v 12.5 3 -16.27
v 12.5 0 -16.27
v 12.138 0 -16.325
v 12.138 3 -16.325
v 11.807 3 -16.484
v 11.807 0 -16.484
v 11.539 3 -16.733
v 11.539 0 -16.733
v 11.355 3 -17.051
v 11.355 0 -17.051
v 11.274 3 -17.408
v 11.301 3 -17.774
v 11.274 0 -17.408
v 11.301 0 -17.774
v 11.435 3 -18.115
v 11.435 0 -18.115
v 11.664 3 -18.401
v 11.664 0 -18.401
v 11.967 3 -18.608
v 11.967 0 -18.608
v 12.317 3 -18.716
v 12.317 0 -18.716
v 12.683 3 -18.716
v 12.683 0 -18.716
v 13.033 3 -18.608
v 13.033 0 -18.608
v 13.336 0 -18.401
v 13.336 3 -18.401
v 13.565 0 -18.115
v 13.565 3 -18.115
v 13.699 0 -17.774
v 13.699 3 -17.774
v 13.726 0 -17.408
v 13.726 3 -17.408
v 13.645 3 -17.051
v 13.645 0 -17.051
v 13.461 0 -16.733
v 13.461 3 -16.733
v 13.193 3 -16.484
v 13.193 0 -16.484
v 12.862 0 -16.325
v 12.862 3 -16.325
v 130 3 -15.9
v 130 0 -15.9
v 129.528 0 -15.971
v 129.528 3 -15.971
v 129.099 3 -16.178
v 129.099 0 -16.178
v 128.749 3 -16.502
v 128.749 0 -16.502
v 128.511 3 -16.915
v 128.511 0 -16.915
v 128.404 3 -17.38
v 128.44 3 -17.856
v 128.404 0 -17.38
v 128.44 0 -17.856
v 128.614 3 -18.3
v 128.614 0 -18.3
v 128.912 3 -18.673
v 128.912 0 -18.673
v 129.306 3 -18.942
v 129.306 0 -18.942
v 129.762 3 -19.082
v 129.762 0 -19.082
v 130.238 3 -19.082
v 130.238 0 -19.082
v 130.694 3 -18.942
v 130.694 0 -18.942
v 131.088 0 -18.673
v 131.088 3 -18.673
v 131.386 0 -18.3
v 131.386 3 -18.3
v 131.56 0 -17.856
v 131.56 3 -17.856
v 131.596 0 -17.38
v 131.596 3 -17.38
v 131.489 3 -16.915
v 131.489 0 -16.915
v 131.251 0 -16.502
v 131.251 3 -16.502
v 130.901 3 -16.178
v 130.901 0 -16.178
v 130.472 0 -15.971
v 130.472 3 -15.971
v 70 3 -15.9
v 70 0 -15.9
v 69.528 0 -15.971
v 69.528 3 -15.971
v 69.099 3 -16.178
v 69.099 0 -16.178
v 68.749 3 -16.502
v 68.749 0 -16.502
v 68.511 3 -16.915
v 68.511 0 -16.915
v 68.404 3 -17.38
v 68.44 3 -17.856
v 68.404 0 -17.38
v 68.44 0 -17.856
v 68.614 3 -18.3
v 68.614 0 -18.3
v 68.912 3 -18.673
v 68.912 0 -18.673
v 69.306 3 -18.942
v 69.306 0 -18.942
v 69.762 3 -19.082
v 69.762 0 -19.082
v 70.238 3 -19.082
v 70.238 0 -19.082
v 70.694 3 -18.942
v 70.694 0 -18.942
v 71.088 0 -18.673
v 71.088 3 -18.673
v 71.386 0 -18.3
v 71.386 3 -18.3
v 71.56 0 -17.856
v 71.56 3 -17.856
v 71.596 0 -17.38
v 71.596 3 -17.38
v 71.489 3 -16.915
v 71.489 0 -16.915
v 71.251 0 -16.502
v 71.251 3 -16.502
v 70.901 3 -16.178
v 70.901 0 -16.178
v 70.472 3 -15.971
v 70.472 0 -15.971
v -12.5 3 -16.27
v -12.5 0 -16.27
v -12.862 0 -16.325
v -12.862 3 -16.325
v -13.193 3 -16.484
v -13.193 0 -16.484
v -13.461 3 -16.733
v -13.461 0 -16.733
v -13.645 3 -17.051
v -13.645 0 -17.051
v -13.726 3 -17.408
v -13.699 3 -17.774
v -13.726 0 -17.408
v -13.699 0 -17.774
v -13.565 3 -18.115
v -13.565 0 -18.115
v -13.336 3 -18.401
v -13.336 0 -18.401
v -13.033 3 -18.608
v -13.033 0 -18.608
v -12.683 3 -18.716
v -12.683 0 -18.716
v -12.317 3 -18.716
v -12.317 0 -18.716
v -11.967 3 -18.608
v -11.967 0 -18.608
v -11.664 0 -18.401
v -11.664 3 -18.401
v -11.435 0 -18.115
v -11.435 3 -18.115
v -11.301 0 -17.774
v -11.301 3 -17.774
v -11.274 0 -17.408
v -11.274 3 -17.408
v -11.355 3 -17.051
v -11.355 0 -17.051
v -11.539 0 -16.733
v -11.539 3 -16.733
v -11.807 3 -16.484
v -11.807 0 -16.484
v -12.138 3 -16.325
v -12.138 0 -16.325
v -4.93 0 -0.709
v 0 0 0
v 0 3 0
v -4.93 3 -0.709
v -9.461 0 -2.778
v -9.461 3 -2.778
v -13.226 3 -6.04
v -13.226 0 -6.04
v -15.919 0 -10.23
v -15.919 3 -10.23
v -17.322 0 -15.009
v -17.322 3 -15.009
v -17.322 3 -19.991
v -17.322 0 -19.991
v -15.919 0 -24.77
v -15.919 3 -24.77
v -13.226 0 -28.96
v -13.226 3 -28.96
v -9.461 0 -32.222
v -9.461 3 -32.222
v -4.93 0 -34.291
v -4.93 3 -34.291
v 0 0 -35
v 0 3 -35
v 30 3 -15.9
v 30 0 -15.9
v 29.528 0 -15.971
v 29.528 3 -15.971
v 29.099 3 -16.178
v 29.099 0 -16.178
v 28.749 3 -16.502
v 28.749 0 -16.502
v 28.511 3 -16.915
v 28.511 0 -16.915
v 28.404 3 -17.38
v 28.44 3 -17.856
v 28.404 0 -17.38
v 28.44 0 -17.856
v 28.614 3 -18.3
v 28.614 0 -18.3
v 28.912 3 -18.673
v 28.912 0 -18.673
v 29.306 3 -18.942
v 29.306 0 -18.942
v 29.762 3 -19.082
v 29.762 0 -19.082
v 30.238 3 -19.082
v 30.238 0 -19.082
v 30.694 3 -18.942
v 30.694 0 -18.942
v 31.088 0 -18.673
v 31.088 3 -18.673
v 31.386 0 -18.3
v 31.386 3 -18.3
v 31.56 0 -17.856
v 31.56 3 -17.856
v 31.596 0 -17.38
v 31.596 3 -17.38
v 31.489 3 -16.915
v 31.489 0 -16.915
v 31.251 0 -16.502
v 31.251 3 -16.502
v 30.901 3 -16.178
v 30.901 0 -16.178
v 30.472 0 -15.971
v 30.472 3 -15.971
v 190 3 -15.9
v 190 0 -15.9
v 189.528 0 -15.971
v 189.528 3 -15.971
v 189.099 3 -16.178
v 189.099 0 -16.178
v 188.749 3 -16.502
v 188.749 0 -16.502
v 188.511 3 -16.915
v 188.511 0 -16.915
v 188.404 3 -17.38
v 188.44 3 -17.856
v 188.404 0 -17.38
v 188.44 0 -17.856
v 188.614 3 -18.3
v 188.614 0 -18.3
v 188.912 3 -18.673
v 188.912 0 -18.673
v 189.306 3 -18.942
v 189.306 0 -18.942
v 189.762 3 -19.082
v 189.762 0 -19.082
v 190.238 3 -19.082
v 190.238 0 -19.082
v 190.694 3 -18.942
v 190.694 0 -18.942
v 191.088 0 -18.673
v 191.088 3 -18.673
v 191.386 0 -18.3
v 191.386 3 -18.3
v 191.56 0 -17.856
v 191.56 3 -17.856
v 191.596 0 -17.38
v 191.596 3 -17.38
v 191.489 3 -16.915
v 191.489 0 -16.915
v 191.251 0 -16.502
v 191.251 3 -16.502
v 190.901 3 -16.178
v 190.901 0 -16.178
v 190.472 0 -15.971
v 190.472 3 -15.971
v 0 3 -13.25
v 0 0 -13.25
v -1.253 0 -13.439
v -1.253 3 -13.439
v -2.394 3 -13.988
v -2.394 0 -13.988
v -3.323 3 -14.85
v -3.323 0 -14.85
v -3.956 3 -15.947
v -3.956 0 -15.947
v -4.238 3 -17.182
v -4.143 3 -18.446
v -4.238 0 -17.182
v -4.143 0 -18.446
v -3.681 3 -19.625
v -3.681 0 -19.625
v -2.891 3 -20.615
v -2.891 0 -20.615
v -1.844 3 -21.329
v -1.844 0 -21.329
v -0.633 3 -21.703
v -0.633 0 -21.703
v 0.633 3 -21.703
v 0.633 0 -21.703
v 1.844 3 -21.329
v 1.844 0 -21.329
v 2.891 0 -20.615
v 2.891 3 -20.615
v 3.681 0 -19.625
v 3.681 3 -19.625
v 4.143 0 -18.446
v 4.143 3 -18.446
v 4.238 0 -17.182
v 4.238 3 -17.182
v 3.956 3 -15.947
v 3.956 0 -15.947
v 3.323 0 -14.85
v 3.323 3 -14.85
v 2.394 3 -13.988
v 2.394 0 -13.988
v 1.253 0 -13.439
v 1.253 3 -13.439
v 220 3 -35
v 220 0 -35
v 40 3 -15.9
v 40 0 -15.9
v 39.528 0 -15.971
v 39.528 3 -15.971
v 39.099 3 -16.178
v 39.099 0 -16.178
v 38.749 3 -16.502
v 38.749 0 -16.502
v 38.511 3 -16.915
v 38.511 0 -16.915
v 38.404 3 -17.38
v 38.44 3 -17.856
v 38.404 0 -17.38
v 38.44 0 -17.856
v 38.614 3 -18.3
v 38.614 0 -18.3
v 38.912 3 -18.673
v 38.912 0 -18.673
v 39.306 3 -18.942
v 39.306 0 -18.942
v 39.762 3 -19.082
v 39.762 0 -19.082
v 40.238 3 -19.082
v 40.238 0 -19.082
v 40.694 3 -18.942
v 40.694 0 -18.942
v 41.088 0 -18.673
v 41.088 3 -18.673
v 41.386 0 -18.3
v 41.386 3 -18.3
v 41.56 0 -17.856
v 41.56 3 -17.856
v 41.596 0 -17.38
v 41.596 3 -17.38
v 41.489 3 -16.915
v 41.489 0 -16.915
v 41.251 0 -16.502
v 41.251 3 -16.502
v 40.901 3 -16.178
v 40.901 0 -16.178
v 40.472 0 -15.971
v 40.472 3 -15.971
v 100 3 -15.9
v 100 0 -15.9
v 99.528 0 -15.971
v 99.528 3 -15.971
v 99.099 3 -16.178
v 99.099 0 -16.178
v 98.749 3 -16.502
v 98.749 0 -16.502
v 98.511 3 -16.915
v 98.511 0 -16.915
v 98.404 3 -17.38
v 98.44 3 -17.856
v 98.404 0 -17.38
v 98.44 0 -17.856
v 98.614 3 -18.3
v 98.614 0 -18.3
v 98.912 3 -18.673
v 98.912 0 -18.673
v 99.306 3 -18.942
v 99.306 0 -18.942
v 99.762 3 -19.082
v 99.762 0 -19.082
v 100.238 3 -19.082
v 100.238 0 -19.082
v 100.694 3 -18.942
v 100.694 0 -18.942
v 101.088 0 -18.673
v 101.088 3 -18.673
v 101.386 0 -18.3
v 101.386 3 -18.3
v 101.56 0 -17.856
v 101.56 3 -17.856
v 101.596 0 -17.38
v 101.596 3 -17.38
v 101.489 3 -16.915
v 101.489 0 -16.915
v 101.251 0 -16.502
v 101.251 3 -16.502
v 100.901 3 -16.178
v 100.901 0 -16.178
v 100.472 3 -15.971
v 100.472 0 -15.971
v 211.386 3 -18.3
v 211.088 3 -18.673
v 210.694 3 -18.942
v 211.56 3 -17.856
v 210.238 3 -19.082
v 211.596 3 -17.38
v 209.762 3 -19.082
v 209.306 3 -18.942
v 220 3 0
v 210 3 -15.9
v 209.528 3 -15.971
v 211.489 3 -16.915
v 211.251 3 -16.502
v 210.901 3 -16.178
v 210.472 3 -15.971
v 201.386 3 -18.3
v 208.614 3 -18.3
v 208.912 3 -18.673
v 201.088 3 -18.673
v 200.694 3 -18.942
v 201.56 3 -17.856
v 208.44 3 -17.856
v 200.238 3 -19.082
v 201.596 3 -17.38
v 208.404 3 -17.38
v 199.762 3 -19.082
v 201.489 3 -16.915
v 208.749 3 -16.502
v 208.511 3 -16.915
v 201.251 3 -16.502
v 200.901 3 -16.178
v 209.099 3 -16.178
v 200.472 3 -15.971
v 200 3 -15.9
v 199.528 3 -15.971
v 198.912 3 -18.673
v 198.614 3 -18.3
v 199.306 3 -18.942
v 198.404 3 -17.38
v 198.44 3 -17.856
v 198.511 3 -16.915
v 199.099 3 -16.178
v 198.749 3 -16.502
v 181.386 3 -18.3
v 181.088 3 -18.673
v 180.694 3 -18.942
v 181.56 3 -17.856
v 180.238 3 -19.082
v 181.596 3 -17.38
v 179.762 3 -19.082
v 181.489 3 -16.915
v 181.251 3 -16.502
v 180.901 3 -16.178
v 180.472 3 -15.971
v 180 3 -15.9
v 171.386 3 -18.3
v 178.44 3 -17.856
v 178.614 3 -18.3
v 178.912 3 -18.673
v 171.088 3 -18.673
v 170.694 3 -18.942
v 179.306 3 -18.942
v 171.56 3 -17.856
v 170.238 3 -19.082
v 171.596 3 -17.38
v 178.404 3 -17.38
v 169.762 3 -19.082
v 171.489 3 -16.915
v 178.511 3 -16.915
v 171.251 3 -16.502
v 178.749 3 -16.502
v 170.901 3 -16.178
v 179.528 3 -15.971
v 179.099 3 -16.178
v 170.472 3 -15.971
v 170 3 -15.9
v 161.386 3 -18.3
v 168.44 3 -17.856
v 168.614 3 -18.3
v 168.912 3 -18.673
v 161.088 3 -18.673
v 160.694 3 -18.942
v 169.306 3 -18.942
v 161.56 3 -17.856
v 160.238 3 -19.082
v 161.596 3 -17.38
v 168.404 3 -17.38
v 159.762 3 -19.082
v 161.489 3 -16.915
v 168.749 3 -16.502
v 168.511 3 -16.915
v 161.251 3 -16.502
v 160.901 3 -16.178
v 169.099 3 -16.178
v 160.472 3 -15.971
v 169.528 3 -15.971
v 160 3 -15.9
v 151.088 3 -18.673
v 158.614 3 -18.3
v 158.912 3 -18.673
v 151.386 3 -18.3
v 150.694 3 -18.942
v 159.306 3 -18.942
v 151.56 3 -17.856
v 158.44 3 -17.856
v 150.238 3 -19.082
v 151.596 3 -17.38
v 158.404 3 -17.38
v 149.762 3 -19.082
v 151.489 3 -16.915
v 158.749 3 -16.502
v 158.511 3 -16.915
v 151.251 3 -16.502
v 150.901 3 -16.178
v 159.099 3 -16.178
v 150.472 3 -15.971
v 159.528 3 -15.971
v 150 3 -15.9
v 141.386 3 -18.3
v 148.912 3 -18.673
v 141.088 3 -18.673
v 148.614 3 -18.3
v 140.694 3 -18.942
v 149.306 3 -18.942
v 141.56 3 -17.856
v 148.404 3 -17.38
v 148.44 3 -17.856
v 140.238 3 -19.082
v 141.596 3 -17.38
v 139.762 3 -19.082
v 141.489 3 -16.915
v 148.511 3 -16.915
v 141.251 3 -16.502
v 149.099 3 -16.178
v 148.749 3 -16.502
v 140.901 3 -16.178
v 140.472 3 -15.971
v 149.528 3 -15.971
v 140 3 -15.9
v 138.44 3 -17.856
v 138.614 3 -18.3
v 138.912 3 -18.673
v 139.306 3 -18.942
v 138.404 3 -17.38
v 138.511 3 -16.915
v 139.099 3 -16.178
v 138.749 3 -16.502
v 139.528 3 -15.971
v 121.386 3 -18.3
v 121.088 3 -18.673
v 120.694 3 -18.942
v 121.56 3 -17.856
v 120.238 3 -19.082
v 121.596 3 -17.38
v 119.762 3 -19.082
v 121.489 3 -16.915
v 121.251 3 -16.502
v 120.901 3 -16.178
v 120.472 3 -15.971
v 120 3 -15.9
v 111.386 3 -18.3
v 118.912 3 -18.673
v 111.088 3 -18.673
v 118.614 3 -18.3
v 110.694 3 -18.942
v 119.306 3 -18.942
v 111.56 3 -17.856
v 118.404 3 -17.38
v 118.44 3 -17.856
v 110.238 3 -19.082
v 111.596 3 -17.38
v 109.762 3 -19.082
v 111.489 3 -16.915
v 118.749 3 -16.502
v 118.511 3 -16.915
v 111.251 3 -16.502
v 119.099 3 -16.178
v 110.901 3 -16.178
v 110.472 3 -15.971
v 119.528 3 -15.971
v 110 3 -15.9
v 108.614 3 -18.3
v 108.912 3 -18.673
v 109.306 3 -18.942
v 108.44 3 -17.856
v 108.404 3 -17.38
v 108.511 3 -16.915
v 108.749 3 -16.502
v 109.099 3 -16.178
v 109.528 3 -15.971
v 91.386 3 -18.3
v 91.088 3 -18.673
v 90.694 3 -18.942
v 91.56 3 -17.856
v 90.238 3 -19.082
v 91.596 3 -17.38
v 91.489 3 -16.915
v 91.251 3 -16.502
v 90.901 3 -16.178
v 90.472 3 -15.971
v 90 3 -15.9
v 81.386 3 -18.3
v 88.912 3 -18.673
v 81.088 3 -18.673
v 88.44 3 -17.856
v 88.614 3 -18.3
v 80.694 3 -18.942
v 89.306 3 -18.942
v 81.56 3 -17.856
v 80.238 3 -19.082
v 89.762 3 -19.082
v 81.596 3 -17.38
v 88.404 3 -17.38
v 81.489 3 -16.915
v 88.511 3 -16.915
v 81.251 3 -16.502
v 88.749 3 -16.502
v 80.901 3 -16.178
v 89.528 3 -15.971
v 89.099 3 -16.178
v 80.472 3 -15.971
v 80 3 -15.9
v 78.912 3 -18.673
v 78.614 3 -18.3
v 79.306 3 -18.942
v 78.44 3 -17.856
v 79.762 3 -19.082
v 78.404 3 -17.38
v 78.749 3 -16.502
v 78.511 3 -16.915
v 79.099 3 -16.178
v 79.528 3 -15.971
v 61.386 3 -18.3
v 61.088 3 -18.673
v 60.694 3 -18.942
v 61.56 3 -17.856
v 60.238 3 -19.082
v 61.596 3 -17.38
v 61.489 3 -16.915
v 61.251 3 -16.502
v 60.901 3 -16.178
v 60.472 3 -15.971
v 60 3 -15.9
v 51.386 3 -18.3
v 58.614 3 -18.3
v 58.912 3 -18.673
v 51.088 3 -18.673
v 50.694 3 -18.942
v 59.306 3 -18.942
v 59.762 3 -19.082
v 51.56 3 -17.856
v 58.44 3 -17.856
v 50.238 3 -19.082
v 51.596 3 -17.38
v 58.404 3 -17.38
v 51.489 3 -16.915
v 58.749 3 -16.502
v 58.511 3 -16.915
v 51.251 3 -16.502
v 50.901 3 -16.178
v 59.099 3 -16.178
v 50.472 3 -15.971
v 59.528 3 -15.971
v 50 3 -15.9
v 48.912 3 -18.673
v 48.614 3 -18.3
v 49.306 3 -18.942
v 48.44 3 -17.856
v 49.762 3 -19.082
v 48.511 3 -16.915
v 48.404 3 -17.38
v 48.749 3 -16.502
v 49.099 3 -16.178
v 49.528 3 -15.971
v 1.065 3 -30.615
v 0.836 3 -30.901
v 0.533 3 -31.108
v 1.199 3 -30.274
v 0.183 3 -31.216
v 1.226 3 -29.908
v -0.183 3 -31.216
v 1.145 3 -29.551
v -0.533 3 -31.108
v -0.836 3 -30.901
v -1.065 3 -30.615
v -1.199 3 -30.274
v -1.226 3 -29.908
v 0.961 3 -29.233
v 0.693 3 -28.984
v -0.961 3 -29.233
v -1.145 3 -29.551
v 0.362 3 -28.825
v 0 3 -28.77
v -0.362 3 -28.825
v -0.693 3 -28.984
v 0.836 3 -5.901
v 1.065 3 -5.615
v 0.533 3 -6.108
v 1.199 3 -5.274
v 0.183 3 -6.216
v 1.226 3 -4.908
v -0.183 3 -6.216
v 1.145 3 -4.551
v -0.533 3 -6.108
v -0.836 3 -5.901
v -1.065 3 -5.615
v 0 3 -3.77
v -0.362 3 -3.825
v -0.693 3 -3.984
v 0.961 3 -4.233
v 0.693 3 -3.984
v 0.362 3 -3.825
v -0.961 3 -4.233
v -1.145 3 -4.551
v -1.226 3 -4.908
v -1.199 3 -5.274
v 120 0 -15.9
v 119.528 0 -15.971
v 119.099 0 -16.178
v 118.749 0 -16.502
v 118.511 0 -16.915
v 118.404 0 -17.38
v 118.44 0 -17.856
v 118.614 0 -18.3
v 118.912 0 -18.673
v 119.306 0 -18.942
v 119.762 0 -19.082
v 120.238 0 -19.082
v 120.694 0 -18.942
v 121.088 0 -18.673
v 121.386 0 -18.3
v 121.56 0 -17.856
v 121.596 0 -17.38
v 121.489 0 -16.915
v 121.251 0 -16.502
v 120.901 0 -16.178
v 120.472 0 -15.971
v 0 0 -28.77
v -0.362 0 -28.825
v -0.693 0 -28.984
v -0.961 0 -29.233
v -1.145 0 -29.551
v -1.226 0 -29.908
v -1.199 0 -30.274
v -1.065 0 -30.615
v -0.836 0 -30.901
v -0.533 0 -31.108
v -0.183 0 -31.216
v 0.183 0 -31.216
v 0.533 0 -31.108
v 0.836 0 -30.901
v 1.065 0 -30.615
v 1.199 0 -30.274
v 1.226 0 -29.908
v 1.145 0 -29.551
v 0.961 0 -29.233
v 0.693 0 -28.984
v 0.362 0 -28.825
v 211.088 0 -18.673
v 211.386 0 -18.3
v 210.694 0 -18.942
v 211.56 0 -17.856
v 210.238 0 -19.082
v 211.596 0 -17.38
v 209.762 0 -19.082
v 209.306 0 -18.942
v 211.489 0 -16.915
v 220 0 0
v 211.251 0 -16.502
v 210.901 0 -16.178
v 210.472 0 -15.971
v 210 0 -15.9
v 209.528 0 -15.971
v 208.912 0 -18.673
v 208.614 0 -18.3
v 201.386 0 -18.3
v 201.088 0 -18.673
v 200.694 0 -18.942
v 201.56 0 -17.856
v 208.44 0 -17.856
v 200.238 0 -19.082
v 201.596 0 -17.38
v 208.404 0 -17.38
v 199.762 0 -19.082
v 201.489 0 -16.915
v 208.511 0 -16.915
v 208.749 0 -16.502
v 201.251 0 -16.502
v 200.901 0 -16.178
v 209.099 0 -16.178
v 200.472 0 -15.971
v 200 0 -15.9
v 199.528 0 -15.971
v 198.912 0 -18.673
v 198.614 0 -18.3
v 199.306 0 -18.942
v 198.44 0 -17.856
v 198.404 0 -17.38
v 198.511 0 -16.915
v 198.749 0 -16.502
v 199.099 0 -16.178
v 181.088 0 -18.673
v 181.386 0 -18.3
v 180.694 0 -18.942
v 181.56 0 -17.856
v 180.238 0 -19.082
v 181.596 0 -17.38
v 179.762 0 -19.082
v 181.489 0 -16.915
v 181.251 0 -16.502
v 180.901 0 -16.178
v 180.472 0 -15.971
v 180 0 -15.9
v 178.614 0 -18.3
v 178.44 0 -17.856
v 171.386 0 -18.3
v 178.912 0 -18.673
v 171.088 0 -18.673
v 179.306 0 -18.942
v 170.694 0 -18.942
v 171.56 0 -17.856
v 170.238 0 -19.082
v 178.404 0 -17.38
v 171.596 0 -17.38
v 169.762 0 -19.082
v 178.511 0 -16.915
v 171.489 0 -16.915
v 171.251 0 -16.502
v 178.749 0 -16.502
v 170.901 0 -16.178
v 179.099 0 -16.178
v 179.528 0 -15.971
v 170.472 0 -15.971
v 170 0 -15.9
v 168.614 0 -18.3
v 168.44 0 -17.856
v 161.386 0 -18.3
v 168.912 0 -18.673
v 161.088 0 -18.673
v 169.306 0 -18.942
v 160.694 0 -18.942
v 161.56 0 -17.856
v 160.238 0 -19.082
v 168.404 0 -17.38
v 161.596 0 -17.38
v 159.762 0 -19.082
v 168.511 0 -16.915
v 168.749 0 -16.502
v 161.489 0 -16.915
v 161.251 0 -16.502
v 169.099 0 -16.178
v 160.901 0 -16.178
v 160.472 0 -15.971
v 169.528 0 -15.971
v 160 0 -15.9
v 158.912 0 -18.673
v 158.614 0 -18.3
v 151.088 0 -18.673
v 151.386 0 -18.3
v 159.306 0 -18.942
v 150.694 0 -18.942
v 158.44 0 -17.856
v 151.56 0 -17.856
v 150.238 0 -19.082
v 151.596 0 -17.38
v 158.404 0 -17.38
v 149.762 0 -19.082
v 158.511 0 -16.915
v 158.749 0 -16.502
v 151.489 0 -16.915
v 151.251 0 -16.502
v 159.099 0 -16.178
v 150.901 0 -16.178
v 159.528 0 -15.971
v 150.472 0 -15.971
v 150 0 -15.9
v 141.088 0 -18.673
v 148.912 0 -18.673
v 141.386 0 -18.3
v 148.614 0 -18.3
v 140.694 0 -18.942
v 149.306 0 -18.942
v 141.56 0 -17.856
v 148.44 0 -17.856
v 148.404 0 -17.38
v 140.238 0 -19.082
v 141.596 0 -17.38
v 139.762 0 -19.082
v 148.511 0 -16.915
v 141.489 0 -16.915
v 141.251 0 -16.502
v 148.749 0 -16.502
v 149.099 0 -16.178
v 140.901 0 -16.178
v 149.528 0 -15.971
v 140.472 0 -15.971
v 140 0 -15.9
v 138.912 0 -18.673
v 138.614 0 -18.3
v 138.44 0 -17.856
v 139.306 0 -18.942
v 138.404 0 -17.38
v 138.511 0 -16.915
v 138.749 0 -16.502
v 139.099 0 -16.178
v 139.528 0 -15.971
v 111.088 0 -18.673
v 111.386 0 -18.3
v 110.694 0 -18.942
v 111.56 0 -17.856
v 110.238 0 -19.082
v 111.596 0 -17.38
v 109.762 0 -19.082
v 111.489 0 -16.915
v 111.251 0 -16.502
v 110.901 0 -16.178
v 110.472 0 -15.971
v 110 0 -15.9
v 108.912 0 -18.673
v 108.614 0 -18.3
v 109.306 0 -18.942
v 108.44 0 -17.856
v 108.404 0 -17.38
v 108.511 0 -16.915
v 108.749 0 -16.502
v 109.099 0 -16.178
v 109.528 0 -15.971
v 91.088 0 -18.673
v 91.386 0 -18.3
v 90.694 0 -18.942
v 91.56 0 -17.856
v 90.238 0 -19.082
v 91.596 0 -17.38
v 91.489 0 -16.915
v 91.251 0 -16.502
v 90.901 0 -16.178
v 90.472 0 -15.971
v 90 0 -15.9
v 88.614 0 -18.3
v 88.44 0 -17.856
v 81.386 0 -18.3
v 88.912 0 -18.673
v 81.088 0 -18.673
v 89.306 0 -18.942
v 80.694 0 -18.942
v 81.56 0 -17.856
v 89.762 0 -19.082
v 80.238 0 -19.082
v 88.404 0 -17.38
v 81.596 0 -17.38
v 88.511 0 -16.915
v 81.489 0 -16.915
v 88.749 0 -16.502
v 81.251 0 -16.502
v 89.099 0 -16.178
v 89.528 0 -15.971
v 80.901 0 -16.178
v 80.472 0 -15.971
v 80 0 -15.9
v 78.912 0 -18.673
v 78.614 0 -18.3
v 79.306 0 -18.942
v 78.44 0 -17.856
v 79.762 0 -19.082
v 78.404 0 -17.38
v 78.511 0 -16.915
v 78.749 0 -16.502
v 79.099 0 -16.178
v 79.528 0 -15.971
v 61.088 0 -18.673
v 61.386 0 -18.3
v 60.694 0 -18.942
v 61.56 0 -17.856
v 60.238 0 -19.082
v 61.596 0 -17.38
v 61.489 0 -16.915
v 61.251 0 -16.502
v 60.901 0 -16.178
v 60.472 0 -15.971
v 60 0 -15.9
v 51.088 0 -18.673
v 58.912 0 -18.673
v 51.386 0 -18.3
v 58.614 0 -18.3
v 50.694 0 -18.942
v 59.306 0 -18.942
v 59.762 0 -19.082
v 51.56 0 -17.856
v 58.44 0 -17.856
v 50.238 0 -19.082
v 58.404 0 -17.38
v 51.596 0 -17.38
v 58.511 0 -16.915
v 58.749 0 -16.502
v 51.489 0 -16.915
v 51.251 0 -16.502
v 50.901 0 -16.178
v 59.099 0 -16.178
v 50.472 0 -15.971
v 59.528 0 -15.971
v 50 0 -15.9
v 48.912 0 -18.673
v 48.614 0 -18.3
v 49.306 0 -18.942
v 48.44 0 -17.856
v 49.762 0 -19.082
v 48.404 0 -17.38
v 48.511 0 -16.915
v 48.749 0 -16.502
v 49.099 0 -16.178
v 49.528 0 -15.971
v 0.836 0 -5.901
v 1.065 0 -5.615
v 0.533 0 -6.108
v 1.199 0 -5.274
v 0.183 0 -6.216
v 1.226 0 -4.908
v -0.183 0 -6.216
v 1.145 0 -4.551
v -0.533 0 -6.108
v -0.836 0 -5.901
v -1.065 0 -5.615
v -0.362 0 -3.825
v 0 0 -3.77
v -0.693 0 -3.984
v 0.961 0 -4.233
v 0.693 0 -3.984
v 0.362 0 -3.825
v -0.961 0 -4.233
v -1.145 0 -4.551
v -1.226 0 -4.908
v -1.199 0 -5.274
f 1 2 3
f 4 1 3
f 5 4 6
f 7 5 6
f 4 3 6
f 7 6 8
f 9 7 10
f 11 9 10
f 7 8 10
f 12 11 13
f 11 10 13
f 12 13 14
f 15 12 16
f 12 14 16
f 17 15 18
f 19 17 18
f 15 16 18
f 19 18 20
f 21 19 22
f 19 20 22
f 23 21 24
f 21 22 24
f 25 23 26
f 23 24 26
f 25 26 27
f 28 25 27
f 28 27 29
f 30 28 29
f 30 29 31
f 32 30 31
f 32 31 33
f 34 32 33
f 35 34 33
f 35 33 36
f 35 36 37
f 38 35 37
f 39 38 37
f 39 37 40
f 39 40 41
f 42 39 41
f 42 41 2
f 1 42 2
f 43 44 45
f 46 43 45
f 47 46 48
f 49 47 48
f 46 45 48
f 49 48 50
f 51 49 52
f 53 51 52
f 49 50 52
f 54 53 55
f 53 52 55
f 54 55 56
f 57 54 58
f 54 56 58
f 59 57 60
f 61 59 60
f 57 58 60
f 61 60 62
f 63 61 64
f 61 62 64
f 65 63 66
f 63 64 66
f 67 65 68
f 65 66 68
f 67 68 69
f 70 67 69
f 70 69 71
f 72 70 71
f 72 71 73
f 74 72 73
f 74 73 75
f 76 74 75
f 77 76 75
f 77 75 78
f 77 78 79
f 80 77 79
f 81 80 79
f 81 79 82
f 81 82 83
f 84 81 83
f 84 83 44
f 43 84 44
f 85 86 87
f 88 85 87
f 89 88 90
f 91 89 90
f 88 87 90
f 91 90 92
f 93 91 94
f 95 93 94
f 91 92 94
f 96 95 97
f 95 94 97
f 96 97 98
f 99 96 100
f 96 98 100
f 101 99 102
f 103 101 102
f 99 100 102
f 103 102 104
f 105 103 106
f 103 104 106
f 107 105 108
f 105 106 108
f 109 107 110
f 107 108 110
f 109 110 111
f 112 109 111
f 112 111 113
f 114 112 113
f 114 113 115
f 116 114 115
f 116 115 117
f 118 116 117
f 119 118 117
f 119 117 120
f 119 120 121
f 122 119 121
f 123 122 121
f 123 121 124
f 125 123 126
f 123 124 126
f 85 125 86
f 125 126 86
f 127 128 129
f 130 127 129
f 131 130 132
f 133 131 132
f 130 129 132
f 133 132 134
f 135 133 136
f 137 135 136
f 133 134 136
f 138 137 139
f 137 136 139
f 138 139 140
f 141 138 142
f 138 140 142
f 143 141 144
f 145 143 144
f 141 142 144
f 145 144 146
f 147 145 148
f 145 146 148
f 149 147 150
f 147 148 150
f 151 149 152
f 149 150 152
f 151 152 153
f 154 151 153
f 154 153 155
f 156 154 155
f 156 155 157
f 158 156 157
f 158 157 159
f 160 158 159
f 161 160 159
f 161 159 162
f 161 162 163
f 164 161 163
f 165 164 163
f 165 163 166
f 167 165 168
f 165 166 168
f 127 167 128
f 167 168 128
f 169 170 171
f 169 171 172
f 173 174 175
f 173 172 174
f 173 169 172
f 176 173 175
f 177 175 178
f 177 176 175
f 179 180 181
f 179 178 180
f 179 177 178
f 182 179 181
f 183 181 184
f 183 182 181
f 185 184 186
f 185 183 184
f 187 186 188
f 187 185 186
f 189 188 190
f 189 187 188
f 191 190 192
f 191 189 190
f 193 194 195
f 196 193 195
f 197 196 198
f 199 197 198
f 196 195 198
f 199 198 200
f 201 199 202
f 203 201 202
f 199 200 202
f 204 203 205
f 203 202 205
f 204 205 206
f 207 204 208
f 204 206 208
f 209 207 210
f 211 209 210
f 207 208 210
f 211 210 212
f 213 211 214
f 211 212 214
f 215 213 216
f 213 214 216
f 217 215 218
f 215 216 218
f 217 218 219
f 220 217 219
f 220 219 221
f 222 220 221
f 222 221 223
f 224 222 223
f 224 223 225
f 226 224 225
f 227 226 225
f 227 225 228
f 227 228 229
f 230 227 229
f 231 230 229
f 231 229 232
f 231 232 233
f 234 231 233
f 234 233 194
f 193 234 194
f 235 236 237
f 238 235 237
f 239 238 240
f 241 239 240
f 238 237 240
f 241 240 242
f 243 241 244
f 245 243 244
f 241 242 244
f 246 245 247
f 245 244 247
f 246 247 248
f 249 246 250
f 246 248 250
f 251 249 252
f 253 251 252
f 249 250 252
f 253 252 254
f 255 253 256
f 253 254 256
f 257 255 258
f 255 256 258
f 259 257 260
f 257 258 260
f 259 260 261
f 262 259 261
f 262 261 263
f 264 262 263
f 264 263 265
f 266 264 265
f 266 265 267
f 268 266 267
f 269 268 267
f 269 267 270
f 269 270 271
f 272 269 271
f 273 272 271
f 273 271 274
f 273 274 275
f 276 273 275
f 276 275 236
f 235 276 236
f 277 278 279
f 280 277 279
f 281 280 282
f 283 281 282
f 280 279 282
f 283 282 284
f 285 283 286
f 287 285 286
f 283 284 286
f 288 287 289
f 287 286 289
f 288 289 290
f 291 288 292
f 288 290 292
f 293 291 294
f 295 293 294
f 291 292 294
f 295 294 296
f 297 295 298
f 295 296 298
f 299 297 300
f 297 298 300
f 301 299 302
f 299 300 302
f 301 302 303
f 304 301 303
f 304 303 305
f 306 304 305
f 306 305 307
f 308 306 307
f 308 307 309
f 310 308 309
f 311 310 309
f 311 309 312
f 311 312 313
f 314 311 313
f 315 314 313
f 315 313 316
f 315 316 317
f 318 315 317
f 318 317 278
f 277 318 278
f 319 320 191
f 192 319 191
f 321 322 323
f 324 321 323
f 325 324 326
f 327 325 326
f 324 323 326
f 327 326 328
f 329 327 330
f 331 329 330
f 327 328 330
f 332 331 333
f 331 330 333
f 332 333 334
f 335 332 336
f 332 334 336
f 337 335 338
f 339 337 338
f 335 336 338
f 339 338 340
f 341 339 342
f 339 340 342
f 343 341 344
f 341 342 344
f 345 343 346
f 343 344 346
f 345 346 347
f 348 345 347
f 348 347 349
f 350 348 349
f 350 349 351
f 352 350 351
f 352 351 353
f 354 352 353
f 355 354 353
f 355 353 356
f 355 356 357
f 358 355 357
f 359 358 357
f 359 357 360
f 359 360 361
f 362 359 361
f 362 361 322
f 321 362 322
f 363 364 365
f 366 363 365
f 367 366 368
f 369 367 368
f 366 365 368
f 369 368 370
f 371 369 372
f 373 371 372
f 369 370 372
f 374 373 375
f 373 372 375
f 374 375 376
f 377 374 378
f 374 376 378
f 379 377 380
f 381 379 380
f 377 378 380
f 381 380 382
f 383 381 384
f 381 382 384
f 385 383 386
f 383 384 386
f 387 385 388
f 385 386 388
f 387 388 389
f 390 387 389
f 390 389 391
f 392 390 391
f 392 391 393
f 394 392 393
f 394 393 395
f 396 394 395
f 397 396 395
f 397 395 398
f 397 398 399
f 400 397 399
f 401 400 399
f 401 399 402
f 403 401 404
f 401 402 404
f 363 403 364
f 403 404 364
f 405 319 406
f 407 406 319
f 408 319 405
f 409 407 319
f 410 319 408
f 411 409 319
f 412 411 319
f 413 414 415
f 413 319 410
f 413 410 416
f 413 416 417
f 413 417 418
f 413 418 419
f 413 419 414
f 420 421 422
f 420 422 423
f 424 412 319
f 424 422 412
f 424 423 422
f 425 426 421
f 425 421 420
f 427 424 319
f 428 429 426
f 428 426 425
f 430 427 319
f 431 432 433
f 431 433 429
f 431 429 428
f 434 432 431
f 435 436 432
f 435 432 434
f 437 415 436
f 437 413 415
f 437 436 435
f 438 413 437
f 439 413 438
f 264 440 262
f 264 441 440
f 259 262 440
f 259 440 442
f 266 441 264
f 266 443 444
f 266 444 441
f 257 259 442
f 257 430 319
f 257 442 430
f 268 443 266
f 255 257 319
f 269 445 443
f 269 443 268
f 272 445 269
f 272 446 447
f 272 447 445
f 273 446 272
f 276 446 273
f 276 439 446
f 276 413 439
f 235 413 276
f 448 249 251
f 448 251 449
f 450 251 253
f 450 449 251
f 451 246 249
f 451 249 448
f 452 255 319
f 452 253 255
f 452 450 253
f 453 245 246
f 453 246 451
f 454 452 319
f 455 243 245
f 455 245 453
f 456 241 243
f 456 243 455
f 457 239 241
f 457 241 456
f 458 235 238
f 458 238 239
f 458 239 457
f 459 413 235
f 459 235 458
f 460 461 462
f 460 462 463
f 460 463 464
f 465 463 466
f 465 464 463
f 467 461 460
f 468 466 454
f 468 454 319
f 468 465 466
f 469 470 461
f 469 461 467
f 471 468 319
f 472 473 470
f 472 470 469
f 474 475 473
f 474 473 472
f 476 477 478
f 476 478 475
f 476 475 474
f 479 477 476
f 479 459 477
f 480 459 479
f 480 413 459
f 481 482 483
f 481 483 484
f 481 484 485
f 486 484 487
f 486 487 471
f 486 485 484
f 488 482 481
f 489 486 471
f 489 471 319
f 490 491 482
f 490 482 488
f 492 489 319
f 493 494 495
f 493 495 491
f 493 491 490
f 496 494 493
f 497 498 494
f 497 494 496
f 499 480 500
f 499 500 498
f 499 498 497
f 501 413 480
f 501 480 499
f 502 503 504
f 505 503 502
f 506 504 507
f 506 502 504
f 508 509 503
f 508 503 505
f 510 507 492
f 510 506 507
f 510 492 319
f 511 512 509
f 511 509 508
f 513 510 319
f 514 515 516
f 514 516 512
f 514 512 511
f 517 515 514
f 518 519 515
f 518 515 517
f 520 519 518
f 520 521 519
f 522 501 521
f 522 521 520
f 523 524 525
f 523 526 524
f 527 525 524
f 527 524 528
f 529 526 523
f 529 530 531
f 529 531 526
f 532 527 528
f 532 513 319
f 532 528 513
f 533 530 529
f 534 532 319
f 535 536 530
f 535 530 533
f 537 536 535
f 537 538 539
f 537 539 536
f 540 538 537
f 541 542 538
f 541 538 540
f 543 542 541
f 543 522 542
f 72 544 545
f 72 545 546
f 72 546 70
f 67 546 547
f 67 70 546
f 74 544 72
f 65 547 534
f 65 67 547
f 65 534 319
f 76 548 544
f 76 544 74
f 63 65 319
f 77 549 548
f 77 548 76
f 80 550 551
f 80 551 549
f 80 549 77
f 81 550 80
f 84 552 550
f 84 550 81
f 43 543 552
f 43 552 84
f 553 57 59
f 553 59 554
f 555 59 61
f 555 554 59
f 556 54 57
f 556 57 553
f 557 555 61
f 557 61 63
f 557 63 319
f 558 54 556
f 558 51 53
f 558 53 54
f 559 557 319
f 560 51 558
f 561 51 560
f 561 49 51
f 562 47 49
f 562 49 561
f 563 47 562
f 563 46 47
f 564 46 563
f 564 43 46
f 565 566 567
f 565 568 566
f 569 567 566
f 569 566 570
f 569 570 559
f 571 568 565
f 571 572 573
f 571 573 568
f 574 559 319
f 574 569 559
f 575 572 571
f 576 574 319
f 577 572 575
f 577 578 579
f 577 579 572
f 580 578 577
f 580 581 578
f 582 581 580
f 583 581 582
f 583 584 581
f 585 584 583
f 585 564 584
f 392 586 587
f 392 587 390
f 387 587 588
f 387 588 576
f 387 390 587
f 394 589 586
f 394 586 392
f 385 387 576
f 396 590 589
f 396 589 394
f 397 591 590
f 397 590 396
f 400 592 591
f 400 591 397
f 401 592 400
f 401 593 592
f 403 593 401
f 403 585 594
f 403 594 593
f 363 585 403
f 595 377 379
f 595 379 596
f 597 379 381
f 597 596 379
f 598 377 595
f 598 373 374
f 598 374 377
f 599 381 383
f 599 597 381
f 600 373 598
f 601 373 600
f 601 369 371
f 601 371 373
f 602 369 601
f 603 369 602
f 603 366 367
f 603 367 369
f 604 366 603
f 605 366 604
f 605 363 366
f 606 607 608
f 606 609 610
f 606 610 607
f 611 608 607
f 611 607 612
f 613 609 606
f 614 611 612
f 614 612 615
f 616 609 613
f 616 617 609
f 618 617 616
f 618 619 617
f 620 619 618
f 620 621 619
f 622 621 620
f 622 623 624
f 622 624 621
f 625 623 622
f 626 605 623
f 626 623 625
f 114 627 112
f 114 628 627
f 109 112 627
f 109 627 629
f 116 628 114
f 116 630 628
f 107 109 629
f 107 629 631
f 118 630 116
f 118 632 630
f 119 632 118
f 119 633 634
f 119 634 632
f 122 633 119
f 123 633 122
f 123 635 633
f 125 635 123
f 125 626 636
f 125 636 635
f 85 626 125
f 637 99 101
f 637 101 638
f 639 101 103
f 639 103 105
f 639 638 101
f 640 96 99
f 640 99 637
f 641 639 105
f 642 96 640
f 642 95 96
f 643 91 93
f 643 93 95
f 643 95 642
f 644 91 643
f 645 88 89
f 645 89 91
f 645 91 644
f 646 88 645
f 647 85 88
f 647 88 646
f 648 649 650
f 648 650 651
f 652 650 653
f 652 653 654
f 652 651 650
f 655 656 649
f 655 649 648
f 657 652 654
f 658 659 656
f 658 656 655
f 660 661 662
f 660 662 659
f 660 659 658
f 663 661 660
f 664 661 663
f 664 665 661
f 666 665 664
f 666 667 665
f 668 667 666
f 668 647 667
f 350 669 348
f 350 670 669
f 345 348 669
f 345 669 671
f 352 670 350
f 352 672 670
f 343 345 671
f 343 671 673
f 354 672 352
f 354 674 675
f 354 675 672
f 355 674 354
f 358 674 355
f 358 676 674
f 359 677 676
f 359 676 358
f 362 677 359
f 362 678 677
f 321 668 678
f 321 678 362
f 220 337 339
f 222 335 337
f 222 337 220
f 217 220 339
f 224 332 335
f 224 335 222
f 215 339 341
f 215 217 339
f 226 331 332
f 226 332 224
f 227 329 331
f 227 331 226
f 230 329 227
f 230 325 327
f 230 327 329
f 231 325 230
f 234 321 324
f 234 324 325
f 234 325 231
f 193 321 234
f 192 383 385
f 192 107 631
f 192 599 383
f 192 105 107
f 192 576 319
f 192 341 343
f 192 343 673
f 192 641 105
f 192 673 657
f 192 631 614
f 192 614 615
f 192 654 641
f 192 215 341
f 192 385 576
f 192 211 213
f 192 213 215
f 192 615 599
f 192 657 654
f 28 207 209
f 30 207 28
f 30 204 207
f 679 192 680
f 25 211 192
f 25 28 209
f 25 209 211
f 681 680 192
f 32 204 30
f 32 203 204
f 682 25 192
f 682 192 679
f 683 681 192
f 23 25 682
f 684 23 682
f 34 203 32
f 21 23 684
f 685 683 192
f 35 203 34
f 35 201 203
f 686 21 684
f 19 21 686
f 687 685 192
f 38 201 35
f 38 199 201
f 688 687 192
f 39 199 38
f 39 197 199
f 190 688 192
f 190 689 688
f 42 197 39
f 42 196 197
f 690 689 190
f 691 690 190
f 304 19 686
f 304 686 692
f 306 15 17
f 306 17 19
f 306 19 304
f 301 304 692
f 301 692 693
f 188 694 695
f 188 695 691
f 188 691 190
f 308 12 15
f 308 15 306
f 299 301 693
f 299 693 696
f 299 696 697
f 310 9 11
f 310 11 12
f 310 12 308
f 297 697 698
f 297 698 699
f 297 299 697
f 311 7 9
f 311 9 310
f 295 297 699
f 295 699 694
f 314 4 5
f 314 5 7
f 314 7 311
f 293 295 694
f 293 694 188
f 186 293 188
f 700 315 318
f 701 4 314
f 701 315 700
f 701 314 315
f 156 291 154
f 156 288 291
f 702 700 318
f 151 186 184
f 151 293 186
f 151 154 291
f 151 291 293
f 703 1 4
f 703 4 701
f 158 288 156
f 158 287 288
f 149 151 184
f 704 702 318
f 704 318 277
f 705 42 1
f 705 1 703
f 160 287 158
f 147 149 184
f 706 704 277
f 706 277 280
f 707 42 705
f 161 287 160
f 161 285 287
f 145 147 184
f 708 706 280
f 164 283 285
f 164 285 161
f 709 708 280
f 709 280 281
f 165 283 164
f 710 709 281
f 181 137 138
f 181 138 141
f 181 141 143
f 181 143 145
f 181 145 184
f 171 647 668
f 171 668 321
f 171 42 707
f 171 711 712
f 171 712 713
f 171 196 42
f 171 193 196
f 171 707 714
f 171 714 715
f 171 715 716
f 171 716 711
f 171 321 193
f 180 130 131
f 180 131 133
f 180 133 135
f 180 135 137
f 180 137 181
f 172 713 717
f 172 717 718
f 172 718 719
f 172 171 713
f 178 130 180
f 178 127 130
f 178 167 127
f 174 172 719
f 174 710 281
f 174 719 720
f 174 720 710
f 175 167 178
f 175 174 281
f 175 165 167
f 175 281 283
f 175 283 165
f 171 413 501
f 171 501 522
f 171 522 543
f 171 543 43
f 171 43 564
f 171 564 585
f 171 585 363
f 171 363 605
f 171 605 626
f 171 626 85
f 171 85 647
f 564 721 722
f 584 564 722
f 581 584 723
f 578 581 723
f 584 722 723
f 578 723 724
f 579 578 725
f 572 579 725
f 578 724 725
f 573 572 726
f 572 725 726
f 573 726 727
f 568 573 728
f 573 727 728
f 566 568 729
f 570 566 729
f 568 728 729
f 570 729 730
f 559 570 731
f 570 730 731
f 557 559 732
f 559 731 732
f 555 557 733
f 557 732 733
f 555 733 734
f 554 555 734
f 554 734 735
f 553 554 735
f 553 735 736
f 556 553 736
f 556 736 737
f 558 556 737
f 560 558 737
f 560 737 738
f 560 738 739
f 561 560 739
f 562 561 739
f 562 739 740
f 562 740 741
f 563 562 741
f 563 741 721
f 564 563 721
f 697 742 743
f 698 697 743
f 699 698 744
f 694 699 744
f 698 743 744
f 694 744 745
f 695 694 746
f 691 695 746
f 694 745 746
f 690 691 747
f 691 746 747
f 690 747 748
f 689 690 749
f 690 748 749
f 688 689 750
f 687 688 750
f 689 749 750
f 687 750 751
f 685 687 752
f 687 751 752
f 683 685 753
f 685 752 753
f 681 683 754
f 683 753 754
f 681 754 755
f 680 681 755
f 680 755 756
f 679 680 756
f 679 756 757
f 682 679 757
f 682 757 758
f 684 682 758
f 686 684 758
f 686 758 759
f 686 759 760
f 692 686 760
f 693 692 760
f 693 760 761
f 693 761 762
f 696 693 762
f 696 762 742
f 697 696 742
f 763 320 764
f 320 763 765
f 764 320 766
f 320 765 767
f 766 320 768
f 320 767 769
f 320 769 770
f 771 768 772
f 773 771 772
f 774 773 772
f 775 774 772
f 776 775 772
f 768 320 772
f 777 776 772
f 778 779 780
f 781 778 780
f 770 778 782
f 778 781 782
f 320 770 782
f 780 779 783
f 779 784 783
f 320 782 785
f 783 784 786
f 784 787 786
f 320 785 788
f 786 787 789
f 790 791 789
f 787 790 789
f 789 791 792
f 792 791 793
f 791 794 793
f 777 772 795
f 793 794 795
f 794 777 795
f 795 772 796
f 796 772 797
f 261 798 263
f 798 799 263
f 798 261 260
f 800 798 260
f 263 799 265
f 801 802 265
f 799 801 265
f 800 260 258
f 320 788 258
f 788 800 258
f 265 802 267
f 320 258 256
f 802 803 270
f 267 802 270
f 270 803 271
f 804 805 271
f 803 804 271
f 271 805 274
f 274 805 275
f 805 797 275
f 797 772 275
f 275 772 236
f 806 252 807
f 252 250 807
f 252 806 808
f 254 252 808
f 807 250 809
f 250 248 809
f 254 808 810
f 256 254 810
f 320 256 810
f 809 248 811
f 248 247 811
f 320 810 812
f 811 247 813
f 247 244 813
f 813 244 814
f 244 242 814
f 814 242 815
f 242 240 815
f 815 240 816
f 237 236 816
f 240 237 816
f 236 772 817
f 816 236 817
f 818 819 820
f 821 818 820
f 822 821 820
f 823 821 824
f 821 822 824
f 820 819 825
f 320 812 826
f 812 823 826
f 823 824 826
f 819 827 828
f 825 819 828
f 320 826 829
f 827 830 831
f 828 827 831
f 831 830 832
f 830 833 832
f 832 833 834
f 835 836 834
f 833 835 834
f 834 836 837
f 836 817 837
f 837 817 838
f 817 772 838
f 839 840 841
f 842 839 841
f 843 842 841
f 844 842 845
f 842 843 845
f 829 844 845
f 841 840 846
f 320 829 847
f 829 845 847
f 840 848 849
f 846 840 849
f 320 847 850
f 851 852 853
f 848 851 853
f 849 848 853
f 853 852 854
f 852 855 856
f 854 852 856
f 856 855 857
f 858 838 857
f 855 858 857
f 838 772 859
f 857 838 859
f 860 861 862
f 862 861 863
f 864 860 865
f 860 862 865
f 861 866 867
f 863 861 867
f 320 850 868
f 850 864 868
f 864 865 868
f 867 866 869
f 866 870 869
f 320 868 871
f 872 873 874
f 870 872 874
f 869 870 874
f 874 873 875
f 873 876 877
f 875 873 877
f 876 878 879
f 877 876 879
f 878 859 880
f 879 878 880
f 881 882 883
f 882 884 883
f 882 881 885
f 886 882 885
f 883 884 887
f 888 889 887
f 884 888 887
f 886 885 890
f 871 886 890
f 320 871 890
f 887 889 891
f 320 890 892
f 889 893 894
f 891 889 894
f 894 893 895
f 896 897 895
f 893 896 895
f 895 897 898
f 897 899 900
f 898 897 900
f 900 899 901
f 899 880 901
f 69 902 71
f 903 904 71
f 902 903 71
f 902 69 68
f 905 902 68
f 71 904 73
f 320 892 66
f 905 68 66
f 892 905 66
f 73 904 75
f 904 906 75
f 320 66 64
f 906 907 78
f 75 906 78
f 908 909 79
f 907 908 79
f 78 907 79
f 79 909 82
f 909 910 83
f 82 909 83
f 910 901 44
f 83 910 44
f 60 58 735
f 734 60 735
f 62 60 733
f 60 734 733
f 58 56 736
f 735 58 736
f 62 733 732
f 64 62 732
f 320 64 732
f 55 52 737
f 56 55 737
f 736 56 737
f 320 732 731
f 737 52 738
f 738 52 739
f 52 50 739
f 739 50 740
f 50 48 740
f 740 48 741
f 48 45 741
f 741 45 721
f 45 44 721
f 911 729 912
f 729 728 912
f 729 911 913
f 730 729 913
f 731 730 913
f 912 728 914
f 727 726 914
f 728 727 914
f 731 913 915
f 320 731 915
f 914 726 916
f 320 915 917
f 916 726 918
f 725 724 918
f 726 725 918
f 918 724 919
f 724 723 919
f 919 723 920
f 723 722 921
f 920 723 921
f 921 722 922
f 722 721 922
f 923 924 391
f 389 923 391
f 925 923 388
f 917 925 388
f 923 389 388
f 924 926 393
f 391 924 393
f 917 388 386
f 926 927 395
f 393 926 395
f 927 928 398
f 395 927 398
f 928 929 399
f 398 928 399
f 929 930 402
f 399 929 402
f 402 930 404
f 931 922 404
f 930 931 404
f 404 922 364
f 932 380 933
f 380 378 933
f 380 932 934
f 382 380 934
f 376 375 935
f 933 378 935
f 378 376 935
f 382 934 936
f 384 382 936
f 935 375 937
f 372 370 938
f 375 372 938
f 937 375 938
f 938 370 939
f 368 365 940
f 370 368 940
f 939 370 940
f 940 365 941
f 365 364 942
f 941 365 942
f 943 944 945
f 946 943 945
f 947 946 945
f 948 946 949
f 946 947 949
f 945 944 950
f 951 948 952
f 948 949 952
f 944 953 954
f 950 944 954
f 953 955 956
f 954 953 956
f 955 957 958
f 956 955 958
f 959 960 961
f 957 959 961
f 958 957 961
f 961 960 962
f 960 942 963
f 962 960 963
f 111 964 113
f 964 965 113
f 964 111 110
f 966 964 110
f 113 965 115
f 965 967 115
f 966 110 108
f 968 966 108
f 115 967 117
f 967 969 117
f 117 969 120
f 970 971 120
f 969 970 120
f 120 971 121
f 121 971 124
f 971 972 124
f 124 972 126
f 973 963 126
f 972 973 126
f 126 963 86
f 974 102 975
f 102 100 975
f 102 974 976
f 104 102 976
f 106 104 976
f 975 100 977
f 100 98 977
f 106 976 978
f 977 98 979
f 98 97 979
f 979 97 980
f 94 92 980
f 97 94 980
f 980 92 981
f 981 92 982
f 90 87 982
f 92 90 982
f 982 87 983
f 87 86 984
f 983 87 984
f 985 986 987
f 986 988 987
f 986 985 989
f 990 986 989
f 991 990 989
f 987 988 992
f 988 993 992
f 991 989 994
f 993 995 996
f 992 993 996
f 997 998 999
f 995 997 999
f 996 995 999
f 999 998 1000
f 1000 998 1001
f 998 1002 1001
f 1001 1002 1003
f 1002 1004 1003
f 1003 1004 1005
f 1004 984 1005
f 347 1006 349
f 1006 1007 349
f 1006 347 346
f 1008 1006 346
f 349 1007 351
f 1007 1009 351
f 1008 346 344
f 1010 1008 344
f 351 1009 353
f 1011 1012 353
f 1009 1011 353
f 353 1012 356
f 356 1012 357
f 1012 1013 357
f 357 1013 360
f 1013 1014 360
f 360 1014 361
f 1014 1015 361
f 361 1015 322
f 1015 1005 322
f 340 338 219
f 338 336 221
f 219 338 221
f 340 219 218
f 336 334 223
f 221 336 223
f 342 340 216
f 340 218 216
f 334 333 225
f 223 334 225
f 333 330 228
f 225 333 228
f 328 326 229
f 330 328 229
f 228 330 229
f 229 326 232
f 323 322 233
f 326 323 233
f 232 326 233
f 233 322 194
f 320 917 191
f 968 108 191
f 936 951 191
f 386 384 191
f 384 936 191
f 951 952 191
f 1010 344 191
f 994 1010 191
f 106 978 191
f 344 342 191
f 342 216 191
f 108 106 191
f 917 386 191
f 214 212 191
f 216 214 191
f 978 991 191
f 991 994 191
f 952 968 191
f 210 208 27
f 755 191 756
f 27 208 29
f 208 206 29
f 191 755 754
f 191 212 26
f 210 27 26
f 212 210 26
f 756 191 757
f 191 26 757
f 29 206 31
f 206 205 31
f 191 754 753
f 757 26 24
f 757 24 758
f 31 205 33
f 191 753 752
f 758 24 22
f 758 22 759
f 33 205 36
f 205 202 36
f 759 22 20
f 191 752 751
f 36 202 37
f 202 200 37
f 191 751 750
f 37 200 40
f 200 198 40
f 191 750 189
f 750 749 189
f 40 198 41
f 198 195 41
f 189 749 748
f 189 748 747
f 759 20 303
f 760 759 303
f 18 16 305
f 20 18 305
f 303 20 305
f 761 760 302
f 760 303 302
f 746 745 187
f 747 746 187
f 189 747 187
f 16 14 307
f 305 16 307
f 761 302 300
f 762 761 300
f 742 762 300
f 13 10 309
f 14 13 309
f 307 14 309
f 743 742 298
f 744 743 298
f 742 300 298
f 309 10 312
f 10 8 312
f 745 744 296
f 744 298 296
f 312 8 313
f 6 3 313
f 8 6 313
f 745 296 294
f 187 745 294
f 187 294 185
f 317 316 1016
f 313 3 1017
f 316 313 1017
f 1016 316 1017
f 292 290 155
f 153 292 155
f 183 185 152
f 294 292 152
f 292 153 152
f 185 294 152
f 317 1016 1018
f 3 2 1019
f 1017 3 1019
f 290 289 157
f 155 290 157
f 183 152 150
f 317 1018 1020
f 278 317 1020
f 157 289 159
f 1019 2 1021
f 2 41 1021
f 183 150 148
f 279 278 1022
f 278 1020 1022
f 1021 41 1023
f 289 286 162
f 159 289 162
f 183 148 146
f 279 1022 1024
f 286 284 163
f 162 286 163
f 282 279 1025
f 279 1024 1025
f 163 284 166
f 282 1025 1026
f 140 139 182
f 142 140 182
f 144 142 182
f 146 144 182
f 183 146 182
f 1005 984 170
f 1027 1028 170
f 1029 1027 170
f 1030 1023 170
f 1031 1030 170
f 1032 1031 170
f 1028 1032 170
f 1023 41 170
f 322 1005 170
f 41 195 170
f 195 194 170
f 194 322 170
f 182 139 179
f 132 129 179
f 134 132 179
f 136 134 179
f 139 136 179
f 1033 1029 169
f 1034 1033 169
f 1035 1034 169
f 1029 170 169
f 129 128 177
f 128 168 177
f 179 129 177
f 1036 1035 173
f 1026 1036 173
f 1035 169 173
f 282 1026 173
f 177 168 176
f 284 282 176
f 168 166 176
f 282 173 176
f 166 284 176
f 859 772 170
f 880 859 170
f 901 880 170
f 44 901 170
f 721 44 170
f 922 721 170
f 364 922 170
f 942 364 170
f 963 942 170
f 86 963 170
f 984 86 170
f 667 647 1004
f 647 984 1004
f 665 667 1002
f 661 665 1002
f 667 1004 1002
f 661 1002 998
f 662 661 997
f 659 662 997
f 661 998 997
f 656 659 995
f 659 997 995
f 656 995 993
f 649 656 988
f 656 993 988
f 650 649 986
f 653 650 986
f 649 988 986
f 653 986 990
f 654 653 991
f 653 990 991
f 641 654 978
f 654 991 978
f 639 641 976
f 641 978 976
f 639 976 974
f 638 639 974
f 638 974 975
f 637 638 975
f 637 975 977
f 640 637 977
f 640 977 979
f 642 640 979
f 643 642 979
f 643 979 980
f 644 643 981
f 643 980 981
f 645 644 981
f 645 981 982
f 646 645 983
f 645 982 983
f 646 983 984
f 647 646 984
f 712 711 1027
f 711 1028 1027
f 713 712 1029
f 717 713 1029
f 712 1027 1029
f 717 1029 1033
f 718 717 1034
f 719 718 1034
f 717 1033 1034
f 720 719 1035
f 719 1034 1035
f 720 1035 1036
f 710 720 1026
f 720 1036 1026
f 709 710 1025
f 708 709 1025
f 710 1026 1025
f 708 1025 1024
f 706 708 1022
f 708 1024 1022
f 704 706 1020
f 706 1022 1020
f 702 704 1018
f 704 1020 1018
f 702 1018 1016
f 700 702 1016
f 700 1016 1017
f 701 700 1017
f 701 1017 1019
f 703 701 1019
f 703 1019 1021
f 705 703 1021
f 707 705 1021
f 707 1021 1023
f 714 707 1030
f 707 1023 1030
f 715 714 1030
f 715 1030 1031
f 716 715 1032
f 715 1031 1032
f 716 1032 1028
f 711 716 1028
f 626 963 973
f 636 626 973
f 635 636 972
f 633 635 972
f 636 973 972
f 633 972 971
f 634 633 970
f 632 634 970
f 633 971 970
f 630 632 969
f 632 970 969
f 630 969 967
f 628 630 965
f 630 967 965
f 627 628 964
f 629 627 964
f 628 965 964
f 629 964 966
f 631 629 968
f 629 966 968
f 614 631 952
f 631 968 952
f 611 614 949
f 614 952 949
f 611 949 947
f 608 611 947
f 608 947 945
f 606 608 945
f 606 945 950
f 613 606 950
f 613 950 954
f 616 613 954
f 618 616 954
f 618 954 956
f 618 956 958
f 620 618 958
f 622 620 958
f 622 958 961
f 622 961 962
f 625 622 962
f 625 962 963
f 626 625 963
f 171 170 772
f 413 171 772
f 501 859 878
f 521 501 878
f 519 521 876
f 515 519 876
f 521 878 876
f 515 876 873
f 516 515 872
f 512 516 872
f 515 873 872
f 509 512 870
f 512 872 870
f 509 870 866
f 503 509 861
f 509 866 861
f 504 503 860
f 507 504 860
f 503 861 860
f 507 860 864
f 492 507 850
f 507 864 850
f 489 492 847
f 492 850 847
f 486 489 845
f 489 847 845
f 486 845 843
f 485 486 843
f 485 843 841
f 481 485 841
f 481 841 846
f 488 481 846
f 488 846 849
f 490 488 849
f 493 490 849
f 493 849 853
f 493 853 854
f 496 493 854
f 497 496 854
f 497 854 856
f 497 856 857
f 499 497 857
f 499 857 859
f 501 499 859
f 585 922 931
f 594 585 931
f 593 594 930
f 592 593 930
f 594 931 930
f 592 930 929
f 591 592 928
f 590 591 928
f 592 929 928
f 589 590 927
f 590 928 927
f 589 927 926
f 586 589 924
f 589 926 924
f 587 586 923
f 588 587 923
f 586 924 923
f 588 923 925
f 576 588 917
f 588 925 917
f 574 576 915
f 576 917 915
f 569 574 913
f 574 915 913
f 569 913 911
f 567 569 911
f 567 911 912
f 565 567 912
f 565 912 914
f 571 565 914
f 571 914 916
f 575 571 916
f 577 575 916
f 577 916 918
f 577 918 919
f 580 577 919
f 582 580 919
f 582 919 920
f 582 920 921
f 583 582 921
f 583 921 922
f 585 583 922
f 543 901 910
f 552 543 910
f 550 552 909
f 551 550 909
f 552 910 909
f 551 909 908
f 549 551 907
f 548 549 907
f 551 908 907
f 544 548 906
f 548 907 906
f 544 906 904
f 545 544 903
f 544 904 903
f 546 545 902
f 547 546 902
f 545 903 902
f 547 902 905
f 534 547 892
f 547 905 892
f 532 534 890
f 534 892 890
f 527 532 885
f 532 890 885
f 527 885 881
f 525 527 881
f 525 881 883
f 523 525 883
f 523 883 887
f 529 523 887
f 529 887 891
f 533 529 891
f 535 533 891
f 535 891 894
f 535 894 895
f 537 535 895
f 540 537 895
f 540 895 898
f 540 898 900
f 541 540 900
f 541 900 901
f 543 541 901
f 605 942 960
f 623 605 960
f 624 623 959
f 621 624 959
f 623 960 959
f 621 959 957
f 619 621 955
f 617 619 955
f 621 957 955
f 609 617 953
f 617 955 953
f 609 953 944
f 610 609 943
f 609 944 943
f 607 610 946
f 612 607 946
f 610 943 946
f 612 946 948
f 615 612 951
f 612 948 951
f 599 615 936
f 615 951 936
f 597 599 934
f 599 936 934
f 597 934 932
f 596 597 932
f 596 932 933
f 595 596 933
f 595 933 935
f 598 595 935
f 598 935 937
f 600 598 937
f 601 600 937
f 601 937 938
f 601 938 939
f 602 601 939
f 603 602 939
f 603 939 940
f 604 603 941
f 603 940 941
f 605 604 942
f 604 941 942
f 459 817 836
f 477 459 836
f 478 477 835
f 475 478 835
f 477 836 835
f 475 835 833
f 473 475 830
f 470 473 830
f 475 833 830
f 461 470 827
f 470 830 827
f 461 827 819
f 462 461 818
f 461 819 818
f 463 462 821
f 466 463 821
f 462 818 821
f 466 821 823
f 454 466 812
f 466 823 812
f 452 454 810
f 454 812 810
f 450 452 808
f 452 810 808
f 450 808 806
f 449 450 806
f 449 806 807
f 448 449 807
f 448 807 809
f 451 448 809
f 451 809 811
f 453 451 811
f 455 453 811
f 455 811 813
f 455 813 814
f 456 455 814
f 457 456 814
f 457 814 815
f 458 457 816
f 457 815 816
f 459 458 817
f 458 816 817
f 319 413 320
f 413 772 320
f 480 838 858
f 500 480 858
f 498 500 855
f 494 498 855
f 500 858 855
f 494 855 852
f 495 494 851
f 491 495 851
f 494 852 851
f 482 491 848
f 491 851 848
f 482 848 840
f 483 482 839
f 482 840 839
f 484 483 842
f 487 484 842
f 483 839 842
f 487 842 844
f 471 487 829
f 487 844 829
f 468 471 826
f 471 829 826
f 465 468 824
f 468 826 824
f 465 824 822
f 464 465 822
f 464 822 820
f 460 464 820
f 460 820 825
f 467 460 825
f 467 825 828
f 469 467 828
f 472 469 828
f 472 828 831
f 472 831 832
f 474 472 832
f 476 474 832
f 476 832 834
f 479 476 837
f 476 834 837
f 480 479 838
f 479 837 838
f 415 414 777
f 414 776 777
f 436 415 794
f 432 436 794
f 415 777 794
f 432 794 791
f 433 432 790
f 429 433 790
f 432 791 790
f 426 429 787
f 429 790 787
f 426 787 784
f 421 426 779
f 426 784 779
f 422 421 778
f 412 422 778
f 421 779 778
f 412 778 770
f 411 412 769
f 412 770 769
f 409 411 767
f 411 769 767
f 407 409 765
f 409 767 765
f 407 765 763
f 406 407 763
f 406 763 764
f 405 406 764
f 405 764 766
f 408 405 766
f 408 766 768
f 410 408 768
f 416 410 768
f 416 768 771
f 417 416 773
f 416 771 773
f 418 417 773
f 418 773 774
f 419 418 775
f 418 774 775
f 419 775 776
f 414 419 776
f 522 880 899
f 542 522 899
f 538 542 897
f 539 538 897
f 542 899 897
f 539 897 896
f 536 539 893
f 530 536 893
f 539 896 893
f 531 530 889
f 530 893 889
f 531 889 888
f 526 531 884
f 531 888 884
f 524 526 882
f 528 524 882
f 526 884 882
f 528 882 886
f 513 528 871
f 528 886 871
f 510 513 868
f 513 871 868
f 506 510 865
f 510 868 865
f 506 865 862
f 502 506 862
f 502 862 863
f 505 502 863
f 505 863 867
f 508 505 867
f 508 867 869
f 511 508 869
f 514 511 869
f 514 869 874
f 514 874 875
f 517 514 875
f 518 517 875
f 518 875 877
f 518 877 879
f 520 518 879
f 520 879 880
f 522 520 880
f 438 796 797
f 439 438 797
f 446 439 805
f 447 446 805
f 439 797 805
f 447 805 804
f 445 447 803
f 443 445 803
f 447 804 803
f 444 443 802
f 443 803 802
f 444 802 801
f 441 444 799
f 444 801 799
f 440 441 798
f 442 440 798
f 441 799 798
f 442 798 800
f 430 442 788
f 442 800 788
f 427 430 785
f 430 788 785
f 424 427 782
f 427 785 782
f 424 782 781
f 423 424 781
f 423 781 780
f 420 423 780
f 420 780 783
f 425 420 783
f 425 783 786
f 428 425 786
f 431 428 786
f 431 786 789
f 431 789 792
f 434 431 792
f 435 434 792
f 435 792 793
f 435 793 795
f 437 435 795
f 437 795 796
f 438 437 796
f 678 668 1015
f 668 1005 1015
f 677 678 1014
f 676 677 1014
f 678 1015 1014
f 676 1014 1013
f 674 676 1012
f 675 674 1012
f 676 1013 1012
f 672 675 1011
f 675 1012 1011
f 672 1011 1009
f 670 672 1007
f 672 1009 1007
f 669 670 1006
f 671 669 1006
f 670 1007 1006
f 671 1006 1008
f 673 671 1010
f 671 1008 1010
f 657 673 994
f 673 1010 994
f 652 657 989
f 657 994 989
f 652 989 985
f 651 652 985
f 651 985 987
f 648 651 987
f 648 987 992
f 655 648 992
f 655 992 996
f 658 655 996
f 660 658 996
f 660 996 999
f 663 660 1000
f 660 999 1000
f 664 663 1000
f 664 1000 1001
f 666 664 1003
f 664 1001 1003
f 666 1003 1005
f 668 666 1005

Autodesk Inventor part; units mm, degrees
ref_plane "YZ Plane" through (0, 0, 0) normal (1, 0, 0) x (0, 1, 0)
ref_plane "XZ Plane" through (0, 0, 0) normal (0, 1, 0) x (-1, 0, 0)
ref_plane "XY Plane" through (0, 0, 0) normal (0, 0, 1) x (1, 0, 0)
sketch "スケッチ1" plane through (0, 0, 0) normal (0, 1, 0) x (-1, 0, 0)
  line L0 (0, 0) -> (-220, 0)
  line L1 (-220, 0) -> (-220, -35)
  line L2 (-220, -35) -> (0, -35)
  line L3 (0, -35) -> (0, 0)
  arc A0 (0, -35) -> (0, 0) centre (0, -17.5) ccw
  dimension "d0" = 220
  dimension "d1" = 35
  dimension "d2" = 17.5
extrude "押し出し1" add sketch "スケッチ1" along normal blind 3
sketch "スケッチ2" plane through (0, 3, 0) normal (0, 1, 0) x (1, 0, 0)
  line L0 (0, 17.5) -> (238.6526, 17.5)
  line L1 (0, 0) -> (220, 0) projected
  arc A0 (0, 35) -> (0, 0) centre (0, 17.5) ccw projected
  point P0 (30, 17.5)
  point P1 (40, 17.5)
  point P2 (50, 17.5)
  point P3 (60, 17.5)
  point P4 (70, 17.5)
  point P5 (80, 17.5)
  point P6 (90, 17.5)
  point P7 (100, 17.5)
  point P8 (110, 17.5)
  point P9 (120, 17.5)
  point P10 (130, 17.5)
  point P11 (140, 17.5)
  point P12 (150, 17.5)
  point P13 (160, 17.5)
  point P14 (170, 17.5)
  point P15 (180, 17.5)
  point P16 (190, 17.5)
  point P17 (200, 17.5)
  point P18 (210, 17.5)
  point P19 (-17.5, 17.5)
  dimension "d5" = 17.5
  dimension "d7" = 10
  dimension "d8" = 10
  dimension "d9" = 10
  dimension "d10" = 10
  dimension "d11" = 10
  dimension "d12" = 10
  dimension "d13" = 10
  dimension "d14" = 10
  dimension "d15" = 10
  dimension "d16" = 10
  dimension "d17" = 10
  dimension "d18" = 10
  dimension "d19" = 10
  dimension "d20" = 10
  dimension "d21" = 10
  dimension "d22" = 10
  dimension "d23" = 10
  dimension "d24" = 10
  dimension "d35" = 17.5
hole "穴1" at (30, 3, -17.5) at (40, 3, -17.5) at (50, 3, -17.5) at (60, 3, -17.5) at (70, 3, -17.5) at (80, 3, -17.5) at (90, 3, -17.5) at (100, 3, -17.5) at (110, 3, -17.5) at (120, 3, -17.5) at (130, 3, -17.5) at (140, 3, -17.5) at (150, 3, -17.5) at (160, 3, -17.5) at (170, 3, -17.5) at (180, 3, -17.5) at (190, 3, -17.5) at (200, 3, -17.5) at (210, 3, -17.5) direction (0, -1, 0) diameter 3.2 end through all
sketch "スケッチ3" plane through (0, 3, 0) normal (0, 1, 0) x (1, 0, 0)
  line L0 (220, 35) -> (0, 35) projected
  point P0 (0, 0)
  point P1 (0, 17.5)
  dimension "d36" = 17.5
hole "穴2" at (0, 3, -17.5) direction (0, -1, 0) diameter 8.5 end through all
sketch "スケッチ4" plane through (0, 3, 0) normal (0, 1, 0) x (1, 0, 0)
  circle A0 centre (0, 17.5) radius 12.5
  circle A1 centre (0, 17.5) radius 4.25 projected
  line L0 (-6.6439, 17.5) -> (-13.0454, 17.5)
  line L1 (-13.0454, 17.5) -> (1.0104, 17.5)
  point P0 (0, 0)
  point P1 (0, 5)
  point P2 (12.5, 17.5)
  point P3 (0, 30)
  point P4 (-12.5, 17.5)
  dimension "d44" = 25
  dimension "d45" = 0
hole "穴3" at (0, 3, -5) at (12.5, 3, -17.5) at (0, 3, -30) at (-12.5, 3, -17.5) direction (0, -1, 0) diameter 2.459 end through all thread size "M3x0.5" class "6H" standard "ISO Metric profile"
properties part number "arm_plate1" material "アルミニウム 5052"
